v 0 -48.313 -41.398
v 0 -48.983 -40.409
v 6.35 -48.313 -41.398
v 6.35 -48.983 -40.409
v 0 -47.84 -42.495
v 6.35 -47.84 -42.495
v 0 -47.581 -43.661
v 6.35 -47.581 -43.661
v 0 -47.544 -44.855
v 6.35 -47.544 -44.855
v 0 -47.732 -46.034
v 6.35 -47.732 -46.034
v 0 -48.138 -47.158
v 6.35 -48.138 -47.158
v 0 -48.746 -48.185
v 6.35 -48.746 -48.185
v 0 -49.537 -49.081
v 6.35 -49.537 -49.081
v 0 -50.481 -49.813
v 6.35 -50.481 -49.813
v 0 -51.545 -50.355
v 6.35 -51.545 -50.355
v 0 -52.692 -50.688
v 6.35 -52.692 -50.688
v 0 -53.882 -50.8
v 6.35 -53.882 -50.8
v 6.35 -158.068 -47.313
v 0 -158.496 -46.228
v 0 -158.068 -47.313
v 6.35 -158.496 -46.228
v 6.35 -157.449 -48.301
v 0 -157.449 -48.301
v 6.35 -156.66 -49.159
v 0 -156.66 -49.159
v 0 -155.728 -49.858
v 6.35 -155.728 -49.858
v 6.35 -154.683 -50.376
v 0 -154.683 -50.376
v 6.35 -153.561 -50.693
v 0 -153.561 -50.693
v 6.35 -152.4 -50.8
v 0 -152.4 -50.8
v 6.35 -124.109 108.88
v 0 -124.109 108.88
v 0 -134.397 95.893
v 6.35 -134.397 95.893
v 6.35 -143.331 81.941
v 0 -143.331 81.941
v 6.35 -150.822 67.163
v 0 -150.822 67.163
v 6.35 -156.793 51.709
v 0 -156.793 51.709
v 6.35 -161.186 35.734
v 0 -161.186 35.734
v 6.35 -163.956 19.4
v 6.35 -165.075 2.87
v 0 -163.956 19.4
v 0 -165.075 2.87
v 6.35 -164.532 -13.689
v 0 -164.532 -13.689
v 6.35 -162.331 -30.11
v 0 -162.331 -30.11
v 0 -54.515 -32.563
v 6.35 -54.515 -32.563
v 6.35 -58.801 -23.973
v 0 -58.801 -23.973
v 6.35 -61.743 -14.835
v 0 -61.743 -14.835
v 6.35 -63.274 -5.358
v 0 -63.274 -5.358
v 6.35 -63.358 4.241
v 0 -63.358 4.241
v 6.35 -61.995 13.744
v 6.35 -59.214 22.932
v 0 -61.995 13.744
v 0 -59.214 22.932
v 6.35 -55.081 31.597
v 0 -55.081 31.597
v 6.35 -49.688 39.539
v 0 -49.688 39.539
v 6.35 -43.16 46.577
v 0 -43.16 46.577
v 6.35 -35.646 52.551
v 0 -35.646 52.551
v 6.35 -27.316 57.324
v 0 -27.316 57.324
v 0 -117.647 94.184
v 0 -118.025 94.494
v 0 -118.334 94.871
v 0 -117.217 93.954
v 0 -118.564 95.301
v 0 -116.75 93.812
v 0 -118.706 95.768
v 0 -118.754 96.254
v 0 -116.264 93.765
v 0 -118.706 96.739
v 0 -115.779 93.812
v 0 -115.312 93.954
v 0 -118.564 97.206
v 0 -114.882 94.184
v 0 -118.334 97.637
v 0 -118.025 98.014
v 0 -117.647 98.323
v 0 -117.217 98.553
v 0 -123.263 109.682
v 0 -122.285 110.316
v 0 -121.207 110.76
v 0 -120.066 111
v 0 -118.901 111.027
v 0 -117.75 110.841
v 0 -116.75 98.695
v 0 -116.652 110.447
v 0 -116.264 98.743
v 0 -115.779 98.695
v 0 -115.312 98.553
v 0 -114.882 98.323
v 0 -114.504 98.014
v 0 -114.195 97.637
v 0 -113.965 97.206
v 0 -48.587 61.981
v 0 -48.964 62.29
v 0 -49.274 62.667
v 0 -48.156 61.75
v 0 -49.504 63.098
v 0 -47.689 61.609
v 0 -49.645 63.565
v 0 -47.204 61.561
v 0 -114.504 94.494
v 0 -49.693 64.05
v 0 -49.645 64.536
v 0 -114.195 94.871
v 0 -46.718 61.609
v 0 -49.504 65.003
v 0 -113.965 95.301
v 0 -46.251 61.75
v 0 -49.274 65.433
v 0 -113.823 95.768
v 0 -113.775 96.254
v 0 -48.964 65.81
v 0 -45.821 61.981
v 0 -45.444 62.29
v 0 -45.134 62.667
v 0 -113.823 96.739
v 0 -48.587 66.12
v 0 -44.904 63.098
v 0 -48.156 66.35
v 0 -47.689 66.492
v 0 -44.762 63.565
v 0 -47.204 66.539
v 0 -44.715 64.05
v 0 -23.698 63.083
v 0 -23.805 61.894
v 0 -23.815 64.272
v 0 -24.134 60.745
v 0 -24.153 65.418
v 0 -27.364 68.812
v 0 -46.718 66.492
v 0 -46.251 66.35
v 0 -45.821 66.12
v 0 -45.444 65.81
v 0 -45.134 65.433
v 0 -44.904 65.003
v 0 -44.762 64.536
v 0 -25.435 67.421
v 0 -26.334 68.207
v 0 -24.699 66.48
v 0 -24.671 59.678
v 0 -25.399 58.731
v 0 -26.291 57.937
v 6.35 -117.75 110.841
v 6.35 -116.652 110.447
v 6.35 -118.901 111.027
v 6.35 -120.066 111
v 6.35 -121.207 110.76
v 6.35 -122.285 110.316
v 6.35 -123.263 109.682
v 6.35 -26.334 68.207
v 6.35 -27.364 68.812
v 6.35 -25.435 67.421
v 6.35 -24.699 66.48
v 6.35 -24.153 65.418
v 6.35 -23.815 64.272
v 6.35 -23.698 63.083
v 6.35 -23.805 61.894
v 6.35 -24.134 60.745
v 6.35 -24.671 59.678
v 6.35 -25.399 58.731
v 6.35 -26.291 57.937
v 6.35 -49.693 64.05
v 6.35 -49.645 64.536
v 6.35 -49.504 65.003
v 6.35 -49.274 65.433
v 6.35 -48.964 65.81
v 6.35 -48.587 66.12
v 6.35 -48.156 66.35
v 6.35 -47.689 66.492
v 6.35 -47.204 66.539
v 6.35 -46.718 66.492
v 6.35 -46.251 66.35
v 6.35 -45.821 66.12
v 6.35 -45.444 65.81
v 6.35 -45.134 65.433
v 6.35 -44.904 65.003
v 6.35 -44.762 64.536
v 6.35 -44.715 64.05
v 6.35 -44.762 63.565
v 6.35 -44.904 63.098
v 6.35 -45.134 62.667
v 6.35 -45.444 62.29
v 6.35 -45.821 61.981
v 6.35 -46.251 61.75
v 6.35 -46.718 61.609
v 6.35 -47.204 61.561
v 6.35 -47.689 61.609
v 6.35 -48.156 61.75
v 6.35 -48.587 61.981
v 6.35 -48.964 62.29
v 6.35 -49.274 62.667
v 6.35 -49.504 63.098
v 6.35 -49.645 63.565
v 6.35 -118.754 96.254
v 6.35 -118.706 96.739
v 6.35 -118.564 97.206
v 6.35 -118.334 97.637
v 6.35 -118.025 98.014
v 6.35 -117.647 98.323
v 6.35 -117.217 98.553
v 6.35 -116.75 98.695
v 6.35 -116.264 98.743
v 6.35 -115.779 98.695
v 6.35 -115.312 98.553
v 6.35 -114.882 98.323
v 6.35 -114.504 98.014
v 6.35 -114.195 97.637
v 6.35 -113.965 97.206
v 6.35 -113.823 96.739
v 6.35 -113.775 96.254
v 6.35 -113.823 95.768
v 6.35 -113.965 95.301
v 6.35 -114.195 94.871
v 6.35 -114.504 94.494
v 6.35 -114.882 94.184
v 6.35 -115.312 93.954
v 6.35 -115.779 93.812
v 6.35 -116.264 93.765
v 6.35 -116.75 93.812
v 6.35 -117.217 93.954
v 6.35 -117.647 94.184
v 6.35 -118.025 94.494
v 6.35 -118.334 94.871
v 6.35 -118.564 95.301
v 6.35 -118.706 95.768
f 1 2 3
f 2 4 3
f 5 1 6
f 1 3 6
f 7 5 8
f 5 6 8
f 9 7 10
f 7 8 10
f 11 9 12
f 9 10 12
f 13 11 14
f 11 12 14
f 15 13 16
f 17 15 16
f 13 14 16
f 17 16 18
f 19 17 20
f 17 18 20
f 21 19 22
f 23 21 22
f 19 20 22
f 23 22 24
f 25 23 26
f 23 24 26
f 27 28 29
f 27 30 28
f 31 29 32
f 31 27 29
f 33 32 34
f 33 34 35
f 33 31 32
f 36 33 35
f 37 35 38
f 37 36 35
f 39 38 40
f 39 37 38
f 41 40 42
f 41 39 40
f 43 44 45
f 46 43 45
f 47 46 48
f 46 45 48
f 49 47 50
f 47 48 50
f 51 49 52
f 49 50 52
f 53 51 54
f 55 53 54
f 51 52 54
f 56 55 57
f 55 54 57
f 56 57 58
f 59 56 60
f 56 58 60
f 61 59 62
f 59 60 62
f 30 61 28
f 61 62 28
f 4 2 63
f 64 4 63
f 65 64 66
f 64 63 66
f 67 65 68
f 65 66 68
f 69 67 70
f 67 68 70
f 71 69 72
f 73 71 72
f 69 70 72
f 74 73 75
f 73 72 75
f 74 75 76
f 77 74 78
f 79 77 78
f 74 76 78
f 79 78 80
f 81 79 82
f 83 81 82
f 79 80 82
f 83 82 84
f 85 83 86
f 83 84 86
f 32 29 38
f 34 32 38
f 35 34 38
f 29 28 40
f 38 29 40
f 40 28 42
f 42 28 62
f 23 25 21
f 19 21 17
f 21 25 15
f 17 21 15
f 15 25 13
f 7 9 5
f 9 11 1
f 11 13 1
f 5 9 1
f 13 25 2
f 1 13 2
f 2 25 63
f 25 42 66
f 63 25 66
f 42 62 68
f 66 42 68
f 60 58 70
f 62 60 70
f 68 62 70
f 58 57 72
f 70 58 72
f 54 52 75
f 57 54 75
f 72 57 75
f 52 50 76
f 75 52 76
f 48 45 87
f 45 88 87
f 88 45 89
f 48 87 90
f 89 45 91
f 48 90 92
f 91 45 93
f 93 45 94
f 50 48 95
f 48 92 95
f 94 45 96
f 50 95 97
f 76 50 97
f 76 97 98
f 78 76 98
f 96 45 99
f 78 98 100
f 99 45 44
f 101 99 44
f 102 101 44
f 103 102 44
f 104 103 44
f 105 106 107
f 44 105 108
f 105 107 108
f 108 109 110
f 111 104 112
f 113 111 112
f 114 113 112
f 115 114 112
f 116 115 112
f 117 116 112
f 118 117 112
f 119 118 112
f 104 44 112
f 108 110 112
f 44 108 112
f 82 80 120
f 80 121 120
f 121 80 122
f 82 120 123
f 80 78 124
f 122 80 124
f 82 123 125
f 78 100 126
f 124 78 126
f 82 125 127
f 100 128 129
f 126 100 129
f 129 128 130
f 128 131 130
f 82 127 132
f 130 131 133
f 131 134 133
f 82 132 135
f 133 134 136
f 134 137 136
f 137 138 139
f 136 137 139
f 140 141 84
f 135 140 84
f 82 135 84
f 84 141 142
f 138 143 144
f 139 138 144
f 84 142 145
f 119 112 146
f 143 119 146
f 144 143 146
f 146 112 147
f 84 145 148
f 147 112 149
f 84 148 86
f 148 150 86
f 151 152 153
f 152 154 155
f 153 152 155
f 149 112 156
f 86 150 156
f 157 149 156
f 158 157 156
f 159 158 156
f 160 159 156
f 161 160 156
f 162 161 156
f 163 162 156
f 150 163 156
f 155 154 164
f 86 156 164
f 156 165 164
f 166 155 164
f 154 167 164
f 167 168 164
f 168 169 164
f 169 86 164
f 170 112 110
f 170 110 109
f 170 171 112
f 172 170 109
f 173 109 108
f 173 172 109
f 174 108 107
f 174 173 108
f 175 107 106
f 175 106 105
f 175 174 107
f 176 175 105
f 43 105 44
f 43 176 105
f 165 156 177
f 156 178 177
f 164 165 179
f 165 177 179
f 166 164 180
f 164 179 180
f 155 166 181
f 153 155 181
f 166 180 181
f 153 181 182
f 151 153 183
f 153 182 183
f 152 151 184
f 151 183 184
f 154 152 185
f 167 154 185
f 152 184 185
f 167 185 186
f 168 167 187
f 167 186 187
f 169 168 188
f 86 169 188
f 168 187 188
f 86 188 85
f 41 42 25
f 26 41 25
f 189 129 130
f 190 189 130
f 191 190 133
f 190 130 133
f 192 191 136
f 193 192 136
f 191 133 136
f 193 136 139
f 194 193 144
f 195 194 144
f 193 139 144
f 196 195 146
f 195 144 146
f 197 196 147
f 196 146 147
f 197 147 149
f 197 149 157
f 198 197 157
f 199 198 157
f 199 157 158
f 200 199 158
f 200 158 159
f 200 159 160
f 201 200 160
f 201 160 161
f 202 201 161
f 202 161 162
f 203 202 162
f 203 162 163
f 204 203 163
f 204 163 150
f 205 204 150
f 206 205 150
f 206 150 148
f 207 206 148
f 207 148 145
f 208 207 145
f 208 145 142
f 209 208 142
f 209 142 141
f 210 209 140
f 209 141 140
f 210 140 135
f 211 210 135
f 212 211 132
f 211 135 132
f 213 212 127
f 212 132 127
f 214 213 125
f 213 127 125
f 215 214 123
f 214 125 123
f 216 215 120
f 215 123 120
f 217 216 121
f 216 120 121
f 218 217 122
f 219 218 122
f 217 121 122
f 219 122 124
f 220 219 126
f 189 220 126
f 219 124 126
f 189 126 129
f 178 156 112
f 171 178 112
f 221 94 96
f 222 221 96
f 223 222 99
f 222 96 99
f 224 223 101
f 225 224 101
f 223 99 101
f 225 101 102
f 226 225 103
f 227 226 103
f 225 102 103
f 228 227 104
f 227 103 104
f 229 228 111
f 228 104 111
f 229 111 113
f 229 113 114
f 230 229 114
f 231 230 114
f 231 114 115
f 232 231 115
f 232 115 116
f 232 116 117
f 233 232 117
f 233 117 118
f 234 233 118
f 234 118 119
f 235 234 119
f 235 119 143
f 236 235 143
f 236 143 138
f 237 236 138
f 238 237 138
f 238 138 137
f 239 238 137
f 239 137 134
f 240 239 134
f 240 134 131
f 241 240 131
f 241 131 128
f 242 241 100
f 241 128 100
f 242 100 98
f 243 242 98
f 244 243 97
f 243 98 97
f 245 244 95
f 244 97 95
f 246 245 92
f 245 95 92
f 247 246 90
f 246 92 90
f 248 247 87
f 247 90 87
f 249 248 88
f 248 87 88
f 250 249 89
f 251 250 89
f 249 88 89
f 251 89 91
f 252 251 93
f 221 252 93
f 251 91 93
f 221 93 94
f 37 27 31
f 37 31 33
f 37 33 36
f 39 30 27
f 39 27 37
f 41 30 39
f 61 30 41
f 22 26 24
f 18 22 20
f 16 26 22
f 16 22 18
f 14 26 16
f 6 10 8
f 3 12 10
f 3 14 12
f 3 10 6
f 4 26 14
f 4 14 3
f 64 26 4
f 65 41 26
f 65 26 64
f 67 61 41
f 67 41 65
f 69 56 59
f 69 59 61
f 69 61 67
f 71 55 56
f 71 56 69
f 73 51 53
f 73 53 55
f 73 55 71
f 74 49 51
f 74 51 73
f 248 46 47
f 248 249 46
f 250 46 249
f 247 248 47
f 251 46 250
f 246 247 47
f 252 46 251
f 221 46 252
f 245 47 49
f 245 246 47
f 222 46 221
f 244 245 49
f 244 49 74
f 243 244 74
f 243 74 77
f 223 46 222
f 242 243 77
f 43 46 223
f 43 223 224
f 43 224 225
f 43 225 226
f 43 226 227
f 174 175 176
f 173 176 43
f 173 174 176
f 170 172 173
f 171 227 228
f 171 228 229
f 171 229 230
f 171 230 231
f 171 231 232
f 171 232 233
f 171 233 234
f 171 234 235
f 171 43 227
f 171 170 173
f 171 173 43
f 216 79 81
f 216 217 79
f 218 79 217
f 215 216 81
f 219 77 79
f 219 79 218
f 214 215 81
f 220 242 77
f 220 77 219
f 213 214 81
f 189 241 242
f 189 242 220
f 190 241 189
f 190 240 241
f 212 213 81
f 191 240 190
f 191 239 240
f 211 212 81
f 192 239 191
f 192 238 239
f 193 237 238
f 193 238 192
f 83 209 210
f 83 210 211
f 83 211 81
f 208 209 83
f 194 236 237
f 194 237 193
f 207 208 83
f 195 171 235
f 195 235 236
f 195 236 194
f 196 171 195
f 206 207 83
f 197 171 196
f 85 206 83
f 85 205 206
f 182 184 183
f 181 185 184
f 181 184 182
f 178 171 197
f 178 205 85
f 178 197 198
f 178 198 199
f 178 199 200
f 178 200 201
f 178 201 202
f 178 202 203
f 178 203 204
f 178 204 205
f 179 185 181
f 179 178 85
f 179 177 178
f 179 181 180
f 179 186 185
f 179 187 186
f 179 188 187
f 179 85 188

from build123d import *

# Parameters (mm, degrees)
BOSS_EXTRUDE1_DEPTH        = 6.35
F_9_0_196_DIAMETER_HOLE1_D = 4.9784
FILLET1_R                  = 6.35


with BuildPart() as part:
    # Sketch1 → Boss-Extrude1 (new body)
    with BuildSketch(Plane.YZ):
        with BuildLine():
            Line((-13.06131899, 62.142191354), (-120.903176517, 112.429675389))
            ThreePointArc((-120.903176517, 112.429675389), (-161.186470776, 35.734180261), (-157.090324336, -50.8))
            Line((-157.090324336, -50.8), (-38.1, -50.8))
            ThreePointArc((-38.1, -50.8), (-61.994796452, 13.743915485), (-13.06131899, 62.142191354))
        make_face()
    extrude(amount=BOSS_EXTRUDE1_DEPTH)

    # #9 (0.196) Diameter Hole1 (through all)
    with Locations(Plane.YZ.offset(6.35)):
        with Locations((-116.264496524, 96.253723813), (-47.203843152, 64.050212269)):
            Hole(F_9_0_196_DIAMETER_HOLE1_D / 2)

    # Fillet1
    fillet1_edges = [part.edges().sort_by_distance(p)[0] for p in [
        (3.175, -120.903176517, 112.429675389),
        (3.175, -13.06131899, 62.142191354),
        (3.175, -38.1, -50.8),
        (3.175, -157.090324336, -50.8),
    ]]
    fillet(fillet1_edges, radius=FILLET1_R)


solid = part.part
